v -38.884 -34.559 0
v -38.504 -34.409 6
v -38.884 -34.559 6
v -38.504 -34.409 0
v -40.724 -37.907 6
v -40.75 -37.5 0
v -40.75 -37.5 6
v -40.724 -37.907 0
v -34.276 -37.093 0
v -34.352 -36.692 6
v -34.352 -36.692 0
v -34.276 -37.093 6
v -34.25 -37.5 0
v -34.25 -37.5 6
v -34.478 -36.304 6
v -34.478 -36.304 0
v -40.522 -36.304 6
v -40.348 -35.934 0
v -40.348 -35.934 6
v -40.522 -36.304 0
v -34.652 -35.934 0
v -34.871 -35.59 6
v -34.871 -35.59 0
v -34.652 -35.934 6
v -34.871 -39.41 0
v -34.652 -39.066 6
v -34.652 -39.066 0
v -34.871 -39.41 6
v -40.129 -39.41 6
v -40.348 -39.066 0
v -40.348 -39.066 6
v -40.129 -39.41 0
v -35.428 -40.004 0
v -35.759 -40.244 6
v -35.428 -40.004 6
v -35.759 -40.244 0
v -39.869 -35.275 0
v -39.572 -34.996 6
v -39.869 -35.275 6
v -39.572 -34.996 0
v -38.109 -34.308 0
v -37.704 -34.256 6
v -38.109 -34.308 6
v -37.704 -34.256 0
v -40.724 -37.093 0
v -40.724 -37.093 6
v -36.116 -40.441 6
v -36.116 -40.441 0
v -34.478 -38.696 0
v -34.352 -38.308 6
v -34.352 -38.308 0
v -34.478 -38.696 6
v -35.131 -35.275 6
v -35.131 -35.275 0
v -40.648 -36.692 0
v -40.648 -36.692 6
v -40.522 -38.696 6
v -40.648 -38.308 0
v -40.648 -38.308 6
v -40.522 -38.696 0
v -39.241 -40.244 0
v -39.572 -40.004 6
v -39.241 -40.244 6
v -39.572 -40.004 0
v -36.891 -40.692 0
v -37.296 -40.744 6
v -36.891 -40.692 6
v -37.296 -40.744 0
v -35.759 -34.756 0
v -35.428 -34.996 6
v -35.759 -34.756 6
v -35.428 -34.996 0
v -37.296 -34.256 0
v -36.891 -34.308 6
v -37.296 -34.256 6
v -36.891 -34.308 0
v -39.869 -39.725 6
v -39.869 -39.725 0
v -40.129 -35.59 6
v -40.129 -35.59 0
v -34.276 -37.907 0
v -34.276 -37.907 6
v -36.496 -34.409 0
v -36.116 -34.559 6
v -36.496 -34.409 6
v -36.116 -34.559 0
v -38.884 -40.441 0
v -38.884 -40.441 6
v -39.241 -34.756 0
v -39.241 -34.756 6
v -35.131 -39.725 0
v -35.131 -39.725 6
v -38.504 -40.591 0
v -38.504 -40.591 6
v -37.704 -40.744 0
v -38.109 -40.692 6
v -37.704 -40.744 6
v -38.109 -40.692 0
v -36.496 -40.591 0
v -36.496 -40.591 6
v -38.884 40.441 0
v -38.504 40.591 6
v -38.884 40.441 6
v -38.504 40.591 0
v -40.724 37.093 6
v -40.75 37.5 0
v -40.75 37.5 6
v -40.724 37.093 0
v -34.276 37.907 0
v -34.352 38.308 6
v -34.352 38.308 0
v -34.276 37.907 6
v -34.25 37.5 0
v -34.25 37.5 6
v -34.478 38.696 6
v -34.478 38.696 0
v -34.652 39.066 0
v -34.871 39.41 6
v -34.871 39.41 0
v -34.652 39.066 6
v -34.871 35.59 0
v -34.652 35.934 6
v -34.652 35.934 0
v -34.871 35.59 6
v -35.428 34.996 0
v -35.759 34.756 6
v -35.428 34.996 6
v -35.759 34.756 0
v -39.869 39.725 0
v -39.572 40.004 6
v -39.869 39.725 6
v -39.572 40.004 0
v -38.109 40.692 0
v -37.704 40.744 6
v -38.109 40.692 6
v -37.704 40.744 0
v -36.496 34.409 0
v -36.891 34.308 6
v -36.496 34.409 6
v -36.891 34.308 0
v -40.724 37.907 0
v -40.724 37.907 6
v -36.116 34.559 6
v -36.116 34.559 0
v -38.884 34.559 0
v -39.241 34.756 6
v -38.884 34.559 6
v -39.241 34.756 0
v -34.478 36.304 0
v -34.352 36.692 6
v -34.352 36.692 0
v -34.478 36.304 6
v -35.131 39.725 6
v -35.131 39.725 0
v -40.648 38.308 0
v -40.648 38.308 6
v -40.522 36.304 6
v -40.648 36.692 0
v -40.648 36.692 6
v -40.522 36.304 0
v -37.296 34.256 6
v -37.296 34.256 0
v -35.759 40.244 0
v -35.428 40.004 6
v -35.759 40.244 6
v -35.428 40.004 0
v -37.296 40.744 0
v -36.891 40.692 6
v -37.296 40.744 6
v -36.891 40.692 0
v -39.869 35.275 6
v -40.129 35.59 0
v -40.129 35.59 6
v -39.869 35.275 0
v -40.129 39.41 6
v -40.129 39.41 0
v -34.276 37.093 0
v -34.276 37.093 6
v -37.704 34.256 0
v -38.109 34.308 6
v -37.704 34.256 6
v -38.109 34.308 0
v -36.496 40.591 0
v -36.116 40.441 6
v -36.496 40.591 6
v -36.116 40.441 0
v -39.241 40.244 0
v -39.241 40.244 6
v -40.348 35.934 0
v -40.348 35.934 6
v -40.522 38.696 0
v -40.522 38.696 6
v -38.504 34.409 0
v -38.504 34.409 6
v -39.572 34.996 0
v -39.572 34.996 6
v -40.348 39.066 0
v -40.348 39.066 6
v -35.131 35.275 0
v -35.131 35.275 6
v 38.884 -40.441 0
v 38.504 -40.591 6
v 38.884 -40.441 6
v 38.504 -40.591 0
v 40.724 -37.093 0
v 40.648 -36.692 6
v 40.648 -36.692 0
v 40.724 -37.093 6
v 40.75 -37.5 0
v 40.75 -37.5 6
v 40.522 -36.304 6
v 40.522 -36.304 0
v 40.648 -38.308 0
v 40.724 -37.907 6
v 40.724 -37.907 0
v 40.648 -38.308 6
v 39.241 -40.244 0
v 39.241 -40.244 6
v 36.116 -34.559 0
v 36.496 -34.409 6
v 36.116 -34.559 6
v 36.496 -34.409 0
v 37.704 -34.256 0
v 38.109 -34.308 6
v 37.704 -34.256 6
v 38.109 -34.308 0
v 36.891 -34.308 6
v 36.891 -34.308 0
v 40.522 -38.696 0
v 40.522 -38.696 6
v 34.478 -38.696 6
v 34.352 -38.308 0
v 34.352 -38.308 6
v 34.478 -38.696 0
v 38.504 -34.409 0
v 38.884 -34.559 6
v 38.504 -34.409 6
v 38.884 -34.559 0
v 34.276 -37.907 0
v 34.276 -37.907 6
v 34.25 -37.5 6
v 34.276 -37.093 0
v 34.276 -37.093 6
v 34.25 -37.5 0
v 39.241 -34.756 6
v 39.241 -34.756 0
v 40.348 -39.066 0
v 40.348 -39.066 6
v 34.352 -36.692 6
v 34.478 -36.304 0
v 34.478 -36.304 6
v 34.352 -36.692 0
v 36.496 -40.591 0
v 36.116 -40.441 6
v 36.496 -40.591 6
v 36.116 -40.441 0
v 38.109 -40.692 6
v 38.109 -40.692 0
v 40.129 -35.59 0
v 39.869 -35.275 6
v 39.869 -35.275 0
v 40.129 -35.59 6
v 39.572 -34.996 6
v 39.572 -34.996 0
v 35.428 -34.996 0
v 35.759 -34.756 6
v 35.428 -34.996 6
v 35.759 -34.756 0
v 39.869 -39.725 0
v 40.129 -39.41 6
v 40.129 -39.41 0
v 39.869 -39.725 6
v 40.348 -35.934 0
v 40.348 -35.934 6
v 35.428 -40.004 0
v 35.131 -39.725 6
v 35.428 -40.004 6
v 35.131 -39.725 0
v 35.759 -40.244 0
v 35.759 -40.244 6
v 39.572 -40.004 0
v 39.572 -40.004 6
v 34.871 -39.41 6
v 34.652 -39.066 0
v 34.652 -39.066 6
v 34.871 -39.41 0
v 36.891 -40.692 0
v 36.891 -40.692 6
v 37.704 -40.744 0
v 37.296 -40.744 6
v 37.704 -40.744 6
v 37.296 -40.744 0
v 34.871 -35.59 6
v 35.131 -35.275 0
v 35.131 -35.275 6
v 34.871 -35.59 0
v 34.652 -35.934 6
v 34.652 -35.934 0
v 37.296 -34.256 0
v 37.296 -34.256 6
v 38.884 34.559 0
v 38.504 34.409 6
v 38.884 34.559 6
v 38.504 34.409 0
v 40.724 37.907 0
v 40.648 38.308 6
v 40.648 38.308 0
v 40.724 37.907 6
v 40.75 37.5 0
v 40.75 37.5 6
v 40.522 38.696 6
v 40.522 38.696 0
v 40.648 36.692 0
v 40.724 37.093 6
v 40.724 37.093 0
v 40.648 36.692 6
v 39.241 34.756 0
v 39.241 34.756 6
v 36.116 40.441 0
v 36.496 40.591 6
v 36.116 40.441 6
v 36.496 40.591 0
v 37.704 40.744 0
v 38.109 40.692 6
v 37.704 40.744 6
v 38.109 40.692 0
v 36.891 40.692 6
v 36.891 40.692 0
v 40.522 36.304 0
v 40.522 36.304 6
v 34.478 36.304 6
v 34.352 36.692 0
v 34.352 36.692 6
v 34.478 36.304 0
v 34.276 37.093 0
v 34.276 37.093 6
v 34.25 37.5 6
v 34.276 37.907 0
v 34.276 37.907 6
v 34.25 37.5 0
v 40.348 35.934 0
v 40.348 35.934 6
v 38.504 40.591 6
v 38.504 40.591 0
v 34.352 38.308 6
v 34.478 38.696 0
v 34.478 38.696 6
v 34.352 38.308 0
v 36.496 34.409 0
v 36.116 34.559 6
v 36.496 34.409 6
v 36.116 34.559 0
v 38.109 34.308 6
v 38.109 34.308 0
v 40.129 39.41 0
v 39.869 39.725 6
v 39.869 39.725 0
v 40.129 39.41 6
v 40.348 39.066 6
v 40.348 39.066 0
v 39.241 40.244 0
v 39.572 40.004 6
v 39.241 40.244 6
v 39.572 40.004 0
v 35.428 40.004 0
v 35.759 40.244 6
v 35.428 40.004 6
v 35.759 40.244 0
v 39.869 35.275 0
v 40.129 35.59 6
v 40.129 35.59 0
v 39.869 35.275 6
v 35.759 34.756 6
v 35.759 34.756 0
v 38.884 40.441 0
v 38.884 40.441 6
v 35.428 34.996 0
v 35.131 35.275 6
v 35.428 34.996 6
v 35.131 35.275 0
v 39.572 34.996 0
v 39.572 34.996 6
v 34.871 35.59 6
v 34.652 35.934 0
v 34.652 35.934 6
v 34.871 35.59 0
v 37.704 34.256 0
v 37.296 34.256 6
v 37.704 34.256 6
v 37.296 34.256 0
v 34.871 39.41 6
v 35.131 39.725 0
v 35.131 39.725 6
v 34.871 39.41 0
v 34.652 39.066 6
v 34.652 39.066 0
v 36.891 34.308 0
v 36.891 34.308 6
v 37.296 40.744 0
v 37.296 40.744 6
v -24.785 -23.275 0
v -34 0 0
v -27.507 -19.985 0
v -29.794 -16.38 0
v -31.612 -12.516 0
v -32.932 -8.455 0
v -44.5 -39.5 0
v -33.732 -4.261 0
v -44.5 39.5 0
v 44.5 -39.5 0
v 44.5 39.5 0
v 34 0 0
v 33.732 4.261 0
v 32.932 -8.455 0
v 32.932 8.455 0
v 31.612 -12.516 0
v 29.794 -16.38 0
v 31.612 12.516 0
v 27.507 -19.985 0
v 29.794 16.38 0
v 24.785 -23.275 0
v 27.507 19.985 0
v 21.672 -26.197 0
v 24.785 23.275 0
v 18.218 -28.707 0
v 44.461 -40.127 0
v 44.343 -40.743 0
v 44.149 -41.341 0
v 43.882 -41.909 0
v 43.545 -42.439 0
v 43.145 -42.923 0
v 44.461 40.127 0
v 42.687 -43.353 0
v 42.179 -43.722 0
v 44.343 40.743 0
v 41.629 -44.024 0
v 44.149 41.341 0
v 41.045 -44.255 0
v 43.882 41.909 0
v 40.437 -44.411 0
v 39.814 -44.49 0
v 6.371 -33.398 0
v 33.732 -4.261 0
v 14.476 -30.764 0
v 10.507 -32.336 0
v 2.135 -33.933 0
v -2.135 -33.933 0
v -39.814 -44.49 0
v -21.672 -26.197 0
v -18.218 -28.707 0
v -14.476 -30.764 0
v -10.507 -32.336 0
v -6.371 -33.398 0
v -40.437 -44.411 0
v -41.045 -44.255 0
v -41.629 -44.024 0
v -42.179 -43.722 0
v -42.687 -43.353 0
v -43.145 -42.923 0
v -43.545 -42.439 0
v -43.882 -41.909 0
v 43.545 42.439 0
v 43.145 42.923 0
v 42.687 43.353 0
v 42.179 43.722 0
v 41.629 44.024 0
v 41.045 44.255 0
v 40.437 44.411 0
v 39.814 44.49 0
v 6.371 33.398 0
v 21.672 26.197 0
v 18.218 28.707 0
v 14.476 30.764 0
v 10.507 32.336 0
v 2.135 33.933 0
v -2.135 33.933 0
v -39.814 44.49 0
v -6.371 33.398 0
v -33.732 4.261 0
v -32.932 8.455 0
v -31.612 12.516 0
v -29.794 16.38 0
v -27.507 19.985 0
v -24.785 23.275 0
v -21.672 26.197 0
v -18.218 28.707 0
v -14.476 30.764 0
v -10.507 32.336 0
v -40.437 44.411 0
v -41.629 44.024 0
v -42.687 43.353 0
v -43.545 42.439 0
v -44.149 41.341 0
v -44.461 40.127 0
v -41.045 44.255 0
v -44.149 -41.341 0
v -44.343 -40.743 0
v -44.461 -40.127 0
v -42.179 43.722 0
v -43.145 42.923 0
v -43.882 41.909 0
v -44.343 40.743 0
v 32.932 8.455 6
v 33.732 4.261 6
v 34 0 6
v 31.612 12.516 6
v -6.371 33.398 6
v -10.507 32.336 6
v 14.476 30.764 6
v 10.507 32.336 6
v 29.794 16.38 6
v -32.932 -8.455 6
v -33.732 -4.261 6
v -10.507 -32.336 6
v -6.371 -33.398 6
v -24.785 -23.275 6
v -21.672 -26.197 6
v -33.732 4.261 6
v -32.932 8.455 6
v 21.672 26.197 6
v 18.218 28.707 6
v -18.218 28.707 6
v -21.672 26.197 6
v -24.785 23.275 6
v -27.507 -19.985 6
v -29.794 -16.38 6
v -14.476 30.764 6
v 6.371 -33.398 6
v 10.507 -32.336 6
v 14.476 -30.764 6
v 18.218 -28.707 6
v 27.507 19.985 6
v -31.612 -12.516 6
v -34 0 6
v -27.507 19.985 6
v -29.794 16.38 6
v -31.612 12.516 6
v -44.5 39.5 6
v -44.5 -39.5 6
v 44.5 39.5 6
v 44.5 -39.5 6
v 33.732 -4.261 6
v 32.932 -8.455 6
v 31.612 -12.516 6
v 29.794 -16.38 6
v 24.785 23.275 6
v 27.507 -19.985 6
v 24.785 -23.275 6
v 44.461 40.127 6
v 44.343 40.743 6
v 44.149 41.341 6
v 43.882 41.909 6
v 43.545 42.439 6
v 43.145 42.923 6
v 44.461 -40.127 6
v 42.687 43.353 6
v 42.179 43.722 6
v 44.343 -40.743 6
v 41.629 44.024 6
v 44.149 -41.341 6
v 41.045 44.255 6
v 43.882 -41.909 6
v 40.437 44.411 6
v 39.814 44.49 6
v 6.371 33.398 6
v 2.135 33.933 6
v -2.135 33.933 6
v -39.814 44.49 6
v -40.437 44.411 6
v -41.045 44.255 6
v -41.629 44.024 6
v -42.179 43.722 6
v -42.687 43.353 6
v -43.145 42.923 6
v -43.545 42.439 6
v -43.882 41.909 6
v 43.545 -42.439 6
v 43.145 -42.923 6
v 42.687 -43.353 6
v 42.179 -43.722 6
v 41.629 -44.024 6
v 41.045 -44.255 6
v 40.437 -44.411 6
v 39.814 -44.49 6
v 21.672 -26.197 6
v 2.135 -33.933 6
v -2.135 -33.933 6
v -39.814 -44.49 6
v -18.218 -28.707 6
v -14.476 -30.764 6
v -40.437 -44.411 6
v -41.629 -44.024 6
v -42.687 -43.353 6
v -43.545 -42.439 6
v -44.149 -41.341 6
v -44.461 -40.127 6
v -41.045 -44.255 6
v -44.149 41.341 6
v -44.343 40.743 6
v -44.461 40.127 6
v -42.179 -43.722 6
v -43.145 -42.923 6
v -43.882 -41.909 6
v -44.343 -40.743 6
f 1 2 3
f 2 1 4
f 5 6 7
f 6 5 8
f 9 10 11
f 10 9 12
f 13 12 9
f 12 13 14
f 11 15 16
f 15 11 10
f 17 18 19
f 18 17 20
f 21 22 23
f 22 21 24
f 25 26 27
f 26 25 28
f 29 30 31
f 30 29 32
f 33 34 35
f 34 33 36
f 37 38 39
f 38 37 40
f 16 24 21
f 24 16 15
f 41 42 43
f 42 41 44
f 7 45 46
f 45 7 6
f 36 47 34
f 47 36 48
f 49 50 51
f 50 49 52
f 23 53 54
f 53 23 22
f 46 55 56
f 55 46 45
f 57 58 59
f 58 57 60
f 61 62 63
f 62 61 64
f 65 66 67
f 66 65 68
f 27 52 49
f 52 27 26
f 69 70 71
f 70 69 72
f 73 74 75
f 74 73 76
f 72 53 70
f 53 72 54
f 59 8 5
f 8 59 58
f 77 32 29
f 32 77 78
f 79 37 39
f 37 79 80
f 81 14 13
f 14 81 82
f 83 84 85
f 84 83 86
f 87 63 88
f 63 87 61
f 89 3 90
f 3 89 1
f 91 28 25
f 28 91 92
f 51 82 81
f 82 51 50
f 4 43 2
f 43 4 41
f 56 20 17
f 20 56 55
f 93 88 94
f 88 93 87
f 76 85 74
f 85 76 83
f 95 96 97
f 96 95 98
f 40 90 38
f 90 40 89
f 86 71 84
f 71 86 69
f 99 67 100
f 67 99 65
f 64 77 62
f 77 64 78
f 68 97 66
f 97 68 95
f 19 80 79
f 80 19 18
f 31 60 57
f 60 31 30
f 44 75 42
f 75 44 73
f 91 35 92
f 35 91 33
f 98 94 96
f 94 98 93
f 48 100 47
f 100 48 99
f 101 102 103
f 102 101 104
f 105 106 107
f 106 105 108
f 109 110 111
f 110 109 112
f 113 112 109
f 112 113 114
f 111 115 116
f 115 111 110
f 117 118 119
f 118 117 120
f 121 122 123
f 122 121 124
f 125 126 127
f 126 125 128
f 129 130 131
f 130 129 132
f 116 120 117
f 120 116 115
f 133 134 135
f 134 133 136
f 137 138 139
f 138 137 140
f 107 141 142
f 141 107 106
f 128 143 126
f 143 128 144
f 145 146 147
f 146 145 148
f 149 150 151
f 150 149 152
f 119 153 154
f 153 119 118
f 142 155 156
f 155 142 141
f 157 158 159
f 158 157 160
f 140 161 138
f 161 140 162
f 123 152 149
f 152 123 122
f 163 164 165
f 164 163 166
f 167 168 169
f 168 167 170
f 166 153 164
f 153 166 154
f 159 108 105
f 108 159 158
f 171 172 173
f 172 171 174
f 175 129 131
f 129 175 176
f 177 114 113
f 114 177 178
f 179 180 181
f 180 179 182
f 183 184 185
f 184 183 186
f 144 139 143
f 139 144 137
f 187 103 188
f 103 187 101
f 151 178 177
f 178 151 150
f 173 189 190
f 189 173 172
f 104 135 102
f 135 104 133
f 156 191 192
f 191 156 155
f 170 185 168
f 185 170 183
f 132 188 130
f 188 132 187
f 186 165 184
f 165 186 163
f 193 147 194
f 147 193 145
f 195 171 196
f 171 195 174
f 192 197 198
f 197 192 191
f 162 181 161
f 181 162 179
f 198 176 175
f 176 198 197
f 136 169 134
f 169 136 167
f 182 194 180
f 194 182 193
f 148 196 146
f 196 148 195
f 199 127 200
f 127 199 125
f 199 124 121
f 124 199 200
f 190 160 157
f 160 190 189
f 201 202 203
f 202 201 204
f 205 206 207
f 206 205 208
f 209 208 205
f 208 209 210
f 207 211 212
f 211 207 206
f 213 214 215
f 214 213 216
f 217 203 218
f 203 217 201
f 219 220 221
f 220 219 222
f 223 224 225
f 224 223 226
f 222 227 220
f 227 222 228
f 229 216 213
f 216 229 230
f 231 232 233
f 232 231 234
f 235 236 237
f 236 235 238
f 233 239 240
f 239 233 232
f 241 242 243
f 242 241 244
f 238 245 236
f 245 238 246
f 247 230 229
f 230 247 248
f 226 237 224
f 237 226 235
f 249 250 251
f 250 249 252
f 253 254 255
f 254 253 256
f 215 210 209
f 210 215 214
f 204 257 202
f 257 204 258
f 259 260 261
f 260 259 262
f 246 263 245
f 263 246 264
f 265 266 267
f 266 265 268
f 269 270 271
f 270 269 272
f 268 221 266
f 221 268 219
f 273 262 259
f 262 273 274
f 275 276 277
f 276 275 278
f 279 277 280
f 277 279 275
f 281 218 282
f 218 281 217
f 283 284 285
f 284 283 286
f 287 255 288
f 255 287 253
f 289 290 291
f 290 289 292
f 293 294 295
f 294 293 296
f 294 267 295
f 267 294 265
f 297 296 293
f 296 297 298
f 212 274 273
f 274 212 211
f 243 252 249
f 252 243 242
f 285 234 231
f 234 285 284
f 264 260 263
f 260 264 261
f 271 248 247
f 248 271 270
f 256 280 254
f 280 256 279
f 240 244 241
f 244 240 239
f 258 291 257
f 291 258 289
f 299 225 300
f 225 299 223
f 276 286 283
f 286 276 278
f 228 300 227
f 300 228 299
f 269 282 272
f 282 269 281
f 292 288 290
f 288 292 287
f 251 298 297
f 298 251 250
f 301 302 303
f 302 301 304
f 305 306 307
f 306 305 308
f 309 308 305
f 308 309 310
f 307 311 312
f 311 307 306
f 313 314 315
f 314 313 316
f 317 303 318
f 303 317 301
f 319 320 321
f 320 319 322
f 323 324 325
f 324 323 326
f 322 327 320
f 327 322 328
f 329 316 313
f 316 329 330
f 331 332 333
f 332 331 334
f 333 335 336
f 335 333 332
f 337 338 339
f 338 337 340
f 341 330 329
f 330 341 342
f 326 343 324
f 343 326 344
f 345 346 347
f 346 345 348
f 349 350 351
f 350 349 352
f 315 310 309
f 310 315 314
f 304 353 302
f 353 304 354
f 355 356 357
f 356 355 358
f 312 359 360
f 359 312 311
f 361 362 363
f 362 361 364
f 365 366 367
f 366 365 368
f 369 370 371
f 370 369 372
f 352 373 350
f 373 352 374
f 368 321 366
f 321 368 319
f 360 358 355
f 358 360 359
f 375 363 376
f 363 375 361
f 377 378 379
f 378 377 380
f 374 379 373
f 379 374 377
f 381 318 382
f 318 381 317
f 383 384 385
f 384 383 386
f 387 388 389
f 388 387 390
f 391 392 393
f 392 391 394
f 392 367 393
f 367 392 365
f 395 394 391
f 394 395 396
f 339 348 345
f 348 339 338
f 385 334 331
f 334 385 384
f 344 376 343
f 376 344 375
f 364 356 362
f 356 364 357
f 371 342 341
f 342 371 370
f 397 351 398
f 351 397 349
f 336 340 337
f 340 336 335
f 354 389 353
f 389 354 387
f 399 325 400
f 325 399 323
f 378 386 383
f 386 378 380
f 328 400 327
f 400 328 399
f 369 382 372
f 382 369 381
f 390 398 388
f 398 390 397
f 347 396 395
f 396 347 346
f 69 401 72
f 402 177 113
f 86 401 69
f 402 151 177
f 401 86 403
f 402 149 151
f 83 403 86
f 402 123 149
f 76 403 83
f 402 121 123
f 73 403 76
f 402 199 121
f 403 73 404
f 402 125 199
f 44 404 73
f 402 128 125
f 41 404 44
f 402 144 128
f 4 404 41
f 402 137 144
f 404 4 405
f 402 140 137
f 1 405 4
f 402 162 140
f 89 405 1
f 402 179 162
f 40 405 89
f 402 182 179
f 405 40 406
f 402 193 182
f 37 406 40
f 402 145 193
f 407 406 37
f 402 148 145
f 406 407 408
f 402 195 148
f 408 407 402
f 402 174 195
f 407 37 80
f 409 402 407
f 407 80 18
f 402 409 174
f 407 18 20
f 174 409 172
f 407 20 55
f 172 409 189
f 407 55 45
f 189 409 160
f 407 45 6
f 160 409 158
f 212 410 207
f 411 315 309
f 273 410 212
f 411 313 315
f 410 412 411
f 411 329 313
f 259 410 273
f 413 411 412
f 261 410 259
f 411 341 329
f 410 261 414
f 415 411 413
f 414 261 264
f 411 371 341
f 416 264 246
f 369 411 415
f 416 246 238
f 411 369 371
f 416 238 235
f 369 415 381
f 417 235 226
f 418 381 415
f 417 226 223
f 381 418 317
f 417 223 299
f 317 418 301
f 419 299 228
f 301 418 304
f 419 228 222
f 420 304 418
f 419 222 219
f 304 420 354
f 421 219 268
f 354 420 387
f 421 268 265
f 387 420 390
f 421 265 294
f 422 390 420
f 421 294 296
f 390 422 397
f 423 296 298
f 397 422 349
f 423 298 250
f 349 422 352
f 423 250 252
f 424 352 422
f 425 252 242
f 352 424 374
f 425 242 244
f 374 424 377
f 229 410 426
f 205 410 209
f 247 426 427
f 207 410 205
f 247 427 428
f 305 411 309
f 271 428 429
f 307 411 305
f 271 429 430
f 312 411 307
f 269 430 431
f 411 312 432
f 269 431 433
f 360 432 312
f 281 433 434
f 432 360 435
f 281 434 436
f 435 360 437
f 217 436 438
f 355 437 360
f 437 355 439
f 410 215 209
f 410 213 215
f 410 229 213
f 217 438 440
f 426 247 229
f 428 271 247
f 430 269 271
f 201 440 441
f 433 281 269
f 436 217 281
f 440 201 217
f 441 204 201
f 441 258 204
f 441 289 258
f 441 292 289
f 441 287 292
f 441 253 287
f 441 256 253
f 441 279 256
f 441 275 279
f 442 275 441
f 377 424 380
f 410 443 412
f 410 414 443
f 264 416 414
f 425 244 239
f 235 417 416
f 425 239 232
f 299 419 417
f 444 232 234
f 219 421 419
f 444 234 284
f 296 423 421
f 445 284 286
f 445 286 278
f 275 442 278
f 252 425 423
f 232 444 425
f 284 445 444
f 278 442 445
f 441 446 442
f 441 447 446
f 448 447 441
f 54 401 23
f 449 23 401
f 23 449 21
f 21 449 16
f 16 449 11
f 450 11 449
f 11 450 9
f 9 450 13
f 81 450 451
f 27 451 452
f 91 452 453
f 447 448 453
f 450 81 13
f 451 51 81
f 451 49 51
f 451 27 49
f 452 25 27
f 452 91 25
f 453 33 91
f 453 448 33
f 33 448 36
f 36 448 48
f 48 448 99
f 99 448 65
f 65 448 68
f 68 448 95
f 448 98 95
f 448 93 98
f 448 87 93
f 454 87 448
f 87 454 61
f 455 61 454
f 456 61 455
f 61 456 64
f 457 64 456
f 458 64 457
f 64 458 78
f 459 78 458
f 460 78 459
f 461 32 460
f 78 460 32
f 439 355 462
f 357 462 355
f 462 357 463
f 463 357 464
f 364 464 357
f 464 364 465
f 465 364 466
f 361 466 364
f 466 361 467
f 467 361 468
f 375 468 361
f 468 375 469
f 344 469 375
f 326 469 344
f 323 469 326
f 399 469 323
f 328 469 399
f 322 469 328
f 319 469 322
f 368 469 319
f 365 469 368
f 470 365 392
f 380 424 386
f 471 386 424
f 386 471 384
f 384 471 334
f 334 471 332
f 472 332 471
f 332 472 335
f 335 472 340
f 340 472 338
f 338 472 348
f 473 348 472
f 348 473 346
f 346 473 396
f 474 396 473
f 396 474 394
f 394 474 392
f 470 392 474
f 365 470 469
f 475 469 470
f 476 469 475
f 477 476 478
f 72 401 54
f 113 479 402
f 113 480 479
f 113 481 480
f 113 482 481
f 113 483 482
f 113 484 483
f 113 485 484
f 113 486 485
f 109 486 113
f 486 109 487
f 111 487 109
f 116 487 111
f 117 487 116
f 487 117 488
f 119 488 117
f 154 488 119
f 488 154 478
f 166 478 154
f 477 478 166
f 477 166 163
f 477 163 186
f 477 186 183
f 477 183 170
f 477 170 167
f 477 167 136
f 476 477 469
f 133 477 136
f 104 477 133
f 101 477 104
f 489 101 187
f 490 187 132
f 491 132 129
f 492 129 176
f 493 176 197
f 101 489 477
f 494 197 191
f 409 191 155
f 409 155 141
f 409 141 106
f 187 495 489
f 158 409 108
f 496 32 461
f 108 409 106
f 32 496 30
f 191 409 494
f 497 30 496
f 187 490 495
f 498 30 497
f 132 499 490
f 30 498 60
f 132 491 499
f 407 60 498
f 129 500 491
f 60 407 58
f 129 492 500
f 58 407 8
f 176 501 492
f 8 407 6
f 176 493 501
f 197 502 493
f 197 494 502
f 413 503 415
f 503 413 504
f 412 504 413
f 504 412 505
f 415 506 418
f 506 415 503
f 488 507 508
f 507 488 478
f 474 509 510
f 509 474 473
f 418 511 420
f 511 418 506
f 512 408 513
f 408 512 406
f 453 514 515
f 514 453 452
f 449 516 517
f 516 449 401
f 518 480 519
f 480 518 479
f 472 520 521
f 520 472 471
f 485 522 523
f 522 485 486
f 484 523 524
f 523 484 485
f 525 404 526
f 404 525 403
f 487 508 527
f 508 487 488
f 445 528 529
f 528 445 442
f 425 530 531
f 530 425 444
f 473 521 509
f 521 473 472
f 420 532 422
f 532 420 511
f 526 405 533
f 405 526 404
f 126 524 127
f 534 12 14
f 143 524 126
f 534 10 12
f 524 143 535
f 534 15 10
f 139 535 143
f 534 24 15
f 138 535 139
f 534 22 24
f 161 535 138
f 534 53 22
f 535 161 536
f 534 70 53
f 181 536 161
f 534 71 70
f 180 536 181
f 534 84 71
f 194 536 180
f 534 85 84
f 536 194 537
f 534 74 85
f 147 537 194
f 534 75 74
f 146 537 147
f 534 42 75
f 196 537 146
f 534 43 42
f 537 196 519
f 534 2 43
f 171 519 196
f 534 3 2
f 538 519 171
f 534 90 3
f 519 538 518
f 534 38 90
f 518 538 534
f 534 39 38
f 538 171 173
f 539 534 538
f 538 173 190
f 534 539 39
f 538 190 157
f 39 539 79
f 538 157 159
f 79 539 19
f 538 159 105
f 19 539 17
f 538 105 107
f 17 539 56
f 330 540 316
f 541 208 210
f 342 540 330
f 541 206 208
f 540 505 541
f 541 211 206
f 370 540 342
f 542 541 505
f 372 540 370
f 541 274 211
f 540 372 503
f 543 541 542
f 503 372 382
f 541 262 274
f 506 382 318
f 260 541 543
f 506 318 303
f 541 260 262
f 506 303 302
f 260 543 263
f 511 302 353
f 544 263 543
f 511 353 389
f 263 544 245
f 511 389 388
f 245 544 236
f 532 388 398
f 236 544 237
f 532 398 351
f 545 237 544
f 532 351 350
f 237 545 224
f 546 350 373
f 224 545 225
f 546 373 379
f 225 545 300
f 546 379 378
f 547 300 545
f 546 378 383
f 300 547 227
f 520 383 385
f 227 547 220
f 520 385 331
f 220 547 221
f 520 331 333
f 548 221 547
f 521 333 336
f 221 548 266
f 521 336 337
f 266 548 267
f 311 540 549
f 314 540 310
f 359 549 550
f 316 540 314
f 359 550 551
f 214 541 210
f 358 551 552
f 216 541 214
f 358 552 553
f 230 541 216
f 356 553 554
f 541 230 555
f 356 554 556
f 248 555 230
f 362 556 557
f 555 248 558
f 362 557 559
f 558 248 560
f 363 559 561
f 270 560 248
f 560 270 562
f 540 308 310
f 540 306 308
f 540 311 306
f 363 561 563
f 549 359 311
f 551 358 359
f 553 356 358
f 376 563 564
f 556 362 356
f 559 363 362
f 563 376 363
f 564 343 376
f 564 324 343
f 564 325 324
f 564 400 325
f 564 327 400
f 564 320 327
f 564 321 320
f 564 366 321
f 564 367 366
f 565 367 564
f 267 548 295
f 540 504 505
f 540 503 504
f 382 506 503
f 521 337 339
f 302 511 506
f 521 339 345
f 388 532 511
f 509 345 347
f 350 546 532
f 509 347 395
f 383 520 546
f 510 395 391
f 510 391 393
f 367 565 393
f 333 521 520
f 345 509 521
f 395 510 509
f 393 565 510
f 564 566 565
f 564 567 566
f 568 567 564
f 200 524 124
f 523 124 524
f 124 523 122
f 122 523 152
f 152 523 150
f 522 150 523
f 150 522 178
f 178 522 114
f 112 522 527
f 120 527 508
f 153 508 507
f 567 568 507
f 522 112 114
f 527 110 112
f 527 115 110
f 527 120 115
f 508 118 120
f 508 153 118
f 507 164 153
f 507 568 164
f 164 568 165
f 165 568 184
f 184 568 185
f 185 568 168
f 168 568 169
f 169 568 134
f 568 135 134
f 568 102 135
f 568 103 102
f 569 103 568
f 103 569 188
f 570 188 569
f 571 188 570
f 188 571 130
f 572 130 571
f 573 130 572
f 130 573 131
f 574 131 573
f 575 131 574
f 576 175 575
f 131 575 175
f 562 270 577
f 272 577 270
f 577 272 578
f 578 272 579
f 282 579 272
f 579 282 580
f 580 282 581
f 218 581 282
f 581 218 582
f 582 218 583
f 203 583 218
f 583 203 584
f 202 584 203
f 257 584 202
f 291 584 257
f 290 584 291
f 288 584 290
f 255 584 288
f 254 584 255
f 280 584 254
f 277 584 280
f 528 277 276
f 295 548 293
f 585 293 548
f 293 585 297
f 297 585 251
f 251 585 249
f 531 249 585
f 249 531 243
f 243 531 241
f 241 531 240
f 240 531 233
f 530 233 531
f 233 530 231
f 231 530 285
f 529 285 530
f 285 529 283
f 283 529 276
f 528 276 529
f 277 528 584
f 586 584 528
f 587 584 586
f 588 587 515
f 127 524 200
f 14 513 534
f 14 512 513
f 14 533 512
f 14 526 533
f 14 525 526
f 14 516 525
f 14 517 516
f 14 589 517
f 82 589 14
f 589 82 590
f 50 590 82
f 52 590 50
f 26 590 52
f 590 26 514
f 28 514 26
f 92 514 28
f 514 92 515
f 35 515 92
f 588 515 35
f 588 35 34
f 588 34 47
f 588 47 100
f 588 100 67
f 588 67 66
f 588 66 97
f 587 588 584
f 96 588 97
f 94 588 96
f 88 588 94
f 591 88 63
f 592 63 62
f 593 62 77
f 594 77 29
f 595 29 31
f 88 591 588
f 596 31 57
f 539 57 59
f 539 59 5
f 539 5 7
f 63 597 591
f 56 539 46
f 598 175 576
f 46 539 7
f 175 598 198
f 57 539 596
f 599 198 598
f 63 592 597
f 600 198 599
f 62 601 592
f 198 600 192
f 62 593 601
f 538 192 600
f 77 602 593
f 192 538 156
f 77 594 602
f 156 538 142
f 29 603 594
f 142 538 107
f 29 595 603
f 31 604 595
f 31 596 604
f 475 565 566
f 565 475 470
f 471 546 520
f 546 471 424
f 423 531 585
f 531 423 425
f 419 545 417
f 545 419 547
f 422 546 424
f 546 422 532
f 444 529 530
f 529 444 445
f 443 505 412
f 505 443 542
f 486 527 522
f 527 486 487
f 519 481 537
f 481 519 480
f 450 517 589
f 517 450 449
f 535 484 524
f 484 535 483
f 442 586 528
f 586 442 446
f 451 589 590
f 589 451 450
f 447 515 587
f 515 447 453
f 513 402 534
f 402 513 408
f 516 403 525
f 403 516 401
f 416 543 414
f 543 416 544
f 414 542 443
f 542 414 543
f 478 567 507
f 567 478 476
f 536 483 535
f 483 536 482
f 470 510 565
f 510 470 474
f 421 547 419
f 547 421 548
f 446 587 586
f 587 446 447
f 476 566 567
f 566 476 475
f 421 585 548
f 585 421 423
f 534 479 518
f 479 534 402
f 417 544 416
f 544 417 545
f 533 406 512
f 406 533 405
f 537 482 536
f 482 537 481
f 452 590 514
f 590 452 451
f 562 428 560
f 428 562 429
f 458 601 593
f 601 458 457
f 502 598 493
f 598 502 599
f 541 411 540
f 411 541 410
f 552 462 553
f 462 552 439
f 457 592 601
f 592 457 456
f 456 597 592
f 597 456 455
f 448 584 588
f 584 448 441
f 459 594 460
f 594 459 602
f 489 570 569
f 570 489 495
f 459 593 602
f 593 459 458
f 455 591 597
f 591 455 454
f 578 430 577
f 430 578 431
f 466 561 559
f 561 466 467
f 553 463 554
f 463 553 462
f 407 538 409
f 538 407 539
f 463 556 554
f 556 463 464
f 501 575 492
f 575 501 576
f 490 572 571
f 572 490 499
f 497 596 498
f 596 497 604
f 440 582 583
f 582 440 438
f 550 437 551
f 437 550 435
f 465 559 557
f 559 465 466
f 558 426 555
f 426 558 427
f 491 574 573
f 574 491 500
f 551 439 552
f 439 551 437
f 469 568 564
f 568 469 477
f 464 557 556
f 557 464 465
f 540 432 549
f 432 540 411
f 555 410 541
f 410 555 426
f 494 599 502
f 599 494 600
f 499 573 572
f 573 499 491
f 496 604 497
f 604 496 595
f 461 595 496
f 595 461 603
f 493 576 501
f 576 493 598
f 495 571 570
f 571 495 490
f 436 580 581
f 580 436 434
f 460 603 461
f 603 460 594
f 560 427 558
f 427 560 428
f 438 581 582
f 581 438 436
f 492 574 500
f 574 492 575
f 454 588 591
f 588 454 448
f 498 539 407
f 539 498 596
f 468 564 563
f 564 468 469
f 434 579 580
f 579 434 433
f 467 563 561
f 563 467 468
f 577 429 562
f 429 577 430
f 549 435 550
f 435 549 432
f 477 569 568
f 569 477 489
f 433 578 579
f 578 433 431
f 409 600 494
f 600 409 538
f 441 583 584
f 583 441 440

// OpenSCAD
$fn = 50;


difference() {
	union() {
		hull() {
			translate(v = [-39.5000000000, 39.5000000000, 0]) {
				cylinder(h = 6, r = 5);
			}
			translate(v = [39.5000000000, 39.5000000000, 0]) {
				cylinder(h = 6, r = 5);
			}
			translate(v = [-39.5000000000, -39.5000000000, 0]) {
				cylinder(h = 6, r = 5);
			}
			translate(v = [39.5000000000, -39.5000000000, 0]) {
				cylinder(h = 6, r = 5);
			}
		}
	}
	union() {
		#translate(v = [-37.5000000000, -37.5000000000, -100.0000000000]) {
			cylinder(h = 200, r = 3.2500000000);
		}
		#translate(v = [-37.5000000000, 37.5000000000, -100.0000000000]) {
			cylinder(h = 200, r = 3.2500000000);
		}
		#translate(v = [37.5000000000, -37.5000000000, -100.0000000000]) {
			cylinder(h = 200, r = 3.2500000000);
		}
		#translate(v = [37.5000000000, 37.5000000000, -100.0000000000]) {
			cylinder(h = 200, r = 3.2500000000);
		}
		#cylinder(h = 6, r = 34.0000000000);
	}
}
